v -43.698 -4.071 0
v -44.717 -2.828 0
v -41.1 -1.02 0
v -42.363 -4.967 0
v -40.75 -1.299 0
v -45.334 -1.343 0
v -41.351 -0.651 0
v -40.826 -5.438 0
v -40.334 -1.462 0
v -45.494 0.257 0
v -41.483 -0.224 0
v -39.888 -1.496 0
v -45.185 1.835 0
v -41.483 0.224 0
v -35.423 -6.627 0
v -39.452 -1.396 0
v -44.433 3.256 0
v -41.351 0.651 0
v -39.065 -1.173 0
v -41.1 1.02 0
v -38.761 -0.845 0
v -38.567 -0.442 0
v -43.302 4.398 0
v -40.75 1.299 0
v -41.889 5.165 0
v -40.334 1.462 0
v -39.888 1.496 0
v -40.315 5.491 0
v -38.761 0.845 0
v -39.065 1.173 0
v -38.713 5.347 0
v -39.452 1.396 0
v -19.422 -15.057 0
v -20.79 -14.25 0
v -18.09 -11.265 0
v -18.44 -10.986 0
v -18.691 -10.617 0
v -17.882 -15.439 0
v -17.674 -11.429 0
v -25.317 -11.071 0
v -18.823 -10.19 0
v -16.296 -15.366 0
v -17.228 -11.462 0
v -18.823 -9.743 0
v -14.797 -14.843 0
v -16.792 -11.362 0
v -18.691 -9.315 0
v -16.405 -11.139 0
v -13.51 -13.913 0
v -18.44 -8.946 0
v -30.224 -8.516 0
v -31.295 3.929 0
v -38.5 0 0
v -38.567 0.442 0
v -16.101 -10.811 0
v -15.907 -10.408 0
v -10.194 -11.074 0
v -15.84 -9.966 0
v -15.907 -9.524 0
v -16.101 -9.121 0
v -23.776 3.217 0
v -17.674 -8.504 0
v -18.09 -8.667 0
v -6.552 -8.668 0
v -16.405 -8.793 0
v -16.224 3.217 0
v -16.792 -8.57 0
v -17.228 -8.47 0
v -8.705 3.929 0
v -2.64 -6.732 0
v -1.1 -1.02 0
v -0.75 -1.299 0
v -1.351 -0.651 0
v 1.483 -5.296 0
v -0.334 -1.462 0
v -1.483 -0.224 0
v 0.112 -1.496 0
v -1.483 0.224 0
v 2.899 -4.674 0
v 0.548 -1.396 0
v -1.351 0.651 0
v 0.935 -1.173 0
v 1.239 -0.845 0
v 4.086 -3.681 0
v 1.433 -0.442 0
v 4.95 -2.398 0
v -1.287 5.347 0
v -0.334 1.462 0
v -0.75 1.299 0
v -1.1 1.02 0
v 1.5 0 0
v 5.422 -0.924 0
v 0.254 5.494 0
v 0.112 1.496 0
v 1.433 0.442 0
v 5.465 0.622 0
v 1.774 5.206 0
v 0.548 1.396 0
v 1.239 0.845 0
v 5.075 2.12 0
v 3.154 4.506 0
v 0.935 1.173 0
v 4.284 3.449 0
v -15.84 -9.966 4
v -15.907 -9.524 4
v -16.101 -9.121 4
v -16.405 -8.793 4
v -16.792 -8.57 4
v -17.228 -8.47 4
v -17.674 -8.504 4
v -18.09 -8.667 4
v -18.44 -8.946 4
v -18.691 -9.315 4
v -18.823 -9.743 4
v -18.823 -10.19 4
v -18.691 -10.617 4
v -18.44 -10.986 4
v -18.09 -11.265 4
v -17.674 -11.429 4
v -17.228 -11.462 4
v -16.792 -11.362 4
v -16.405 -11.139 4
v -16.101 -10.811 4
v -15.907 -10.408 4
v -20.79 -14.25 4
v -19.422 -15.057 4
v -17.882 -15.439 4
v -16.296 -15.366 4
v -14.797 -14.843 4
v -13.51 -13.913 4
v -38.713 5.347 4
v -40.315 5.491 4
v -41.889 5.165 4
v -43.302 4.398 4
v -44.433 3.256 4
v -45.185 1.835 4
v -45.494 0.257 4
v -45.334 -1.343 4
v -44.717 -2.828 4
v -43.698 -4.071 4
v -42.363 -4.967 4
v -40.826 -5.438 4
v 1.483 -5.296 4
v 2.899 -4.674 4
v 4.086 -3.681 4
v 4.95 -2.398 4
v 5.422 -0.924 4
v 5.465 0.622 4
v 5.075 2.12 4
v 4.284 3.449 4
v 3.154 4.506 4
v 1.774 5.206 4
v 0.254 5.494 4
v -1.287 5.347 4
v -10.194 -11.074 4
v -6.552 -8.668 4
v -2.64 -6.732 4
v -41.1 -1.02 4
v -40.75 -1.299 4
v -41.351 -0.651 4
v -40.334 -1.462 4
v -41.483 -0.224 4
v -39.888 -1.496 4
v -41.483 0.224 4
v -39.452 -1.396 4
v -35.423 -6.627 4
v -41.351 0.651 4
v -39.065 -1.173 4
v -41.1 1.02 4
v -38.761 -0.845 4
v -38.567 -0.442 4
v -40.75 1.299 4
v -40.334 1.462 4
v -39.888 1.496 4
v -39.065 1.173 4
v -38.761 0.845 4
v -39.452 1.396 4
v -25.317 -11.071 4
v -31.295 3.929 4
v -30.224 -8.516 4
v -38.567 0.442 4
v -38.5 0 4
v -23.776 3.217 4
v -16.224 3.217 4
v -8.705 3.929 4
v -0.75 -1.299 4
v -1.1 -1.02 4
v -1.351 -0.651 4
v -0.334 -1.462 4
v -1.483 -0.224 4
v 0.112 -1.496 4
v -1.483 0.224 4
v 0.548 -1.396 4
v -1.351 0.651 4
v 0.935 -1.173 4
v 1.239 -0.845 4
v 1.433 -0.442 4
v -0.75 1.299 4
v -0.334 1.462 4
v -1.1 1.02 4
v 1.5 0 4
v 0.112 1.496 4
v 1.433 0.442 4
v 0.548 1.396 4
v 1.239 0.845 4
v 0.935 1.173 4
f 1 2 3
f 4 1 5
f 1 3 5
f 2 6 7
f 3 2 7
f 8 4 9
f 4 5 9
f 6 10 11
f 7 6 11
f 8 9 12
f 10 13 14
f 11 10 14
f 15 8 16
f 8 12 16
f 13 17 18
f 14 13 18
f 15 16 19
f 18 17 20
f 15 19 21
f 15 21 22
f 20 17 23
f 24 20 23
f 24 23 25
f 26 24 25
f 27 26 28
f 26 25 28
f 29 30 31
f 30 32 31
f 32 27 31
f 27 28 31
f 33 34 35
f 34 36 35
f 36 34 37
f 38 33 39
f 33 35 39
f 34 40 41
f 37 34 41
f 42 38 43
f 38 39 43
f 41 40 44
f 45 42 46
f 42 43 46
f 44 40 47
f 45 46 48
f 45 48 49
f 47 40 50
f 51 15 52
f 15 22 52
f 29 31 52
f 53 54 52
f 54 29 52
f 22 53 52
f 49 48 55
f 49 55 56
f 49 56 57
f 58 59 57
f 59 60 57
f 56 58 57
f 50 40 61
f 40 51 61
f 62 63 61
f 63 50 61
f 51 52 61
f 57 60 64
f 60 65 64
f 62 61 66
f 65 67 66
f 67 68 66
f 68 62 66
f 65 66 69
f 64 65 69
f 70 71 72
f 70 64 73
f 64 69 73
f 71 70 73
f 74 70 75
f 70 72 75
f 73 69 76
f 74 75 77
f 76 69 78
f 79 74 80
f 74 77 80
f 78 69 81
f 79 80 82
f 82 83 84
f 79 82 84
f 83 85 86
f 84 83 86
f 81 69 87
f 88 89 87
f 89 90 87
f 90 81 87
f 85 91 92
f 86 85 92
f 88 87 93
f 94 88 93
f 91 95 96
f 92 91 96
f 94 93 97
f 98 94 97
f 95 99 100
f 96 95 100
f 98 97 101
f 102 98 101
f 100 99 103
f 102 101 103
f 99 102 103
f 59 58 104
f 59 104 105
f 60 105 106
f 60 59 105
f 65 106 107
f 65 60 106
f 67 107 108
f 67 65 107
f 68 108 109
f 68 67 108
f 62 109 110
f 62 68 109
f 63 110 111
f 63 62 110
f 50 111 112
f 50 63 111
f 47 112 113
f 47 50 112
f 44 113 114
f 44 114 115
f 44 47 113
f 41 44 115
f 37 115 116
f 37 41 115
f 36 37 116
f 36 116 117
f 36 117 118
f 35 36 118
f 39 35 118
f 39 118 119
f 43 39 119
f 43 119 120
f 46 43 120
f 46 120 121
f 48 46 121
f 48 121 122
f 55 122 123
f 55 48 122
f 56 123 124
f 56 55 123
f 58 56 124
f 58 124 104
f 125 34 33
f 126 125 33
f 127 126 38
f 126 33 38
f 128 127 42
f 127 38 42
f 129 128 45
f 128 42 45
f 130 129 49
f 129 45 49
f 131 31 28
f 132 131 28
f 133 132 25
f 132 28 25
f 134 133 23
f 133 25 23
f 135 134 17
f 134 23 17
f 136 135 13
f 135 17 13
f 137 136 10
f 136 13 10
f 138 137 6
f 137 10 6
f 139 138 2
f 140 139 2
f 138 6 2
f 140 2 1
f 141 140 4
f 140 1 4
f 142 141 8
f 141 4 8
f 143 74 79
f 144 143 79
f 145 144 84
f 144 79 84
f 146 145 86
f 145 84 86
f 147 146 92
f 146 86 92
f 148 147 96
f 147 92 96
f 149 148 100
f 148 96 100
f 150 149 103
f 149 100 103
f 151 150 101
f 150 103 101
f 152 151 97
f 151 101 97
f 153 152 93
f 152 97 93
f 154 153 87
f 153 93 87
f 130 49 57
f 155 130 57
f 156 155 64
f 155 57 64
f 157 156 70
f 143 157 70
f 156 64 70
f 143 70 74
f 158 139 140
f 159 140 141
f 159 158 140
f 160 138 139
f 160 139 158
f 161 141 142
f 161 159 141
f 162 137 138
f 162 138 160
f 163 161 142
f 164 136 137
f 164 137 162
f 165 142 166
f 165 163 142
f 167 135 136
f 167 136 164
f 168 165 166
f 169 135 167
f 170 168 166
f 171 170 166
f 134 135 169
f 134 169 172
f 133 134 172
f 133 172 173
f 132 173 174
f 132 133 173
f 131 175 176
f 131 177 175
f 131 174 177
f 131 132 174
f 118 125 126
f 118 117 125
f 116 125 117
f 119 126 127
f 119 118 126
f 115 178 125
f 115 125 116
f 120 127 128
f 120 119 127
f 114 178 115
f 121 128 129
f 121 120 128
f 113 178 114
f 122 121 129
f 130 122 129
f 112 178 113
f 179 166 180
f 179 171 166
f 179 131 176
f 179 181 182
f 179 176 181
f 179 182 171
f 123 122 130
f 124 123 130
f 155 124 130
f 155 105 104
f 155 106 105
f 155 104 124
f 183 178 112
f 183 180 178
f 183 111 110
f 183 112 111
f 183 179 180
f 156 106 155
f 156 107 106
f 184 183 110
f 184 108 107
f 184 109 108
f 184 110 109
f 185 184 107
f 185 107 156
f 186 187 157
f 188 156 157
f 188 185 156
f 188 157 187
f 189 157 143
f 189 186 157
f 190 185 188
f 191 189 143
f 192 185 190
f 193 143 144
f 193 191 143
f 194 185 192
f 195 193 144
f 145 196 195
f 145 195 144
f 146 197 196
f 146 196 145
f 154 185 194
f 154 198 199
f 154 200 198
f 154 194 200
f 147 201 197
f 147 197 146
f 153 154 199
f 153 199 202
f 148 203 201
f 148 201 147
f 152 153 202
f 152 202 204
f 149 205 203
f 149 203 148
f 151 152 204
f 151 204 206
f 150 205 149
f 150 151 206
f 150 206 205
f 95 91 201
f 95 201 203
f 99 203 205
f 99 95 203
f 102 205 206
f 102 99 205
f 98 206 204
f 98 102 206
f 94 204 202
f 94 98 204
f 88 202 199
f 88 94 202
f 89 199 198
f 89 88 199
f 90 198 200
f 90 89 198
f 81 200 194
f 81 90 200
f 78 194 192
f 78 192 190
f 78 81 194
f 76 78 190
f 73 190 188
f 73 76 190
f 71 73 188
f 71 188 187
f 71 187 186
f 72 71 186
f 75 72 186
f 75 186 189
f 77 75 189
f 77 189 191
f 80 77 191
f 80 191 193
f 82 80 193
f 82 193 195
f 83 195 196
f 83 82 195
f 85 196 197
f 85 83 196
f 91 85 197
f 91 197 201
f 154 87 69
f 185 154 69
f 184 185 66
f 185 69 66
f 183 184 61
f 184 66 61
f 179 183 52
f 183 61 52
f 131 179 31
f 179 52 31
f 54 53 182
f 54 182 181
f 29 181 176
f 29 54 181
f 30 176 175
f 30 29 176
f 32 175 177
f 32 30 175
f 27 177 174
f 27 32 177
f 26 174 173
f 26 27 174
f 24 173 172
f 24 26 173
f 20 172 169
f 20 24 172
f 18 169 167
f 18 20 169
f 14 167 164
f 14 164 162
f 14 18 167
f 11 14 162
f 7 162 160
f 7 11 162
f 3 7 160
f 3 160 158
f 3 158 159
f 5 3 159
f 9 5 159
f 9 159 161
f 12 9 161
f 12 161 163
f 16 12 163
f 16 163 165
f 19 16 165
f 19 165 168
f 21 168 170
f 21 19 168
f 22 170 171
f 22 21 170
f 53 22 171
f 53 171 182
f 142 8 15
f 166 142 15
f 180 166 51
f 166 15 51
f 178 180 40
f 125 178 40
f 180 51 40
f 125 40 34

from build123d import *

# Parameters (mm, degrees)
SKETCH1_R           = 1.5
BOSS_EXTRUDE1_DEPTH = 4


with BuildPart() as part:
    # Sketch1 → Boss-Extrude1 (new body)
    with BuildSketch(Plane.XY):
        with BuildLine():
            ThreePointArc((-38.713450292, 5.347409639), (-45.397441252, 1.057179235), (-40.825882635, -5.437638998))
            ThreePointArc((-40.825882635, -5.437638998), (-30.223624193, -8.515546688), (-20.789672108, -14.24982501))
            ThreePointArc((-20.789672108, -14.24982501), (-17.086113442, -15.460299774), (-13.509973062, -13.913426824))
            ThreePointArc((-13.509973062, -13.913426824), (-6.552111329, -8.667968977), (1.482746603, -5.29636314))
            ThreePointArc((1.482746603, -5.29636314), (5.322790438, 1.384883371), (-1.286549708, 5.347409639))
            ThreePointArc((-1.286549708, 5.347409639), (-20, 3.127913483), (-38.713450292, 5.347409639))
        make_face()
        with Locations((-40, 0)):
            Circle(SKETCH1_R, mode=Mode.SUBTRACT)
        Circle(SKETCH1_R, mode=Mode.SUBTRACT)
        with Locations((-17.34, -9.966162752)):
            Circle(SKETCH1_R, mode=Mode.SUBTRACT)
    extrude(amount=BOSS_EXTRUDE1_DEPTH)


solid = part.part
